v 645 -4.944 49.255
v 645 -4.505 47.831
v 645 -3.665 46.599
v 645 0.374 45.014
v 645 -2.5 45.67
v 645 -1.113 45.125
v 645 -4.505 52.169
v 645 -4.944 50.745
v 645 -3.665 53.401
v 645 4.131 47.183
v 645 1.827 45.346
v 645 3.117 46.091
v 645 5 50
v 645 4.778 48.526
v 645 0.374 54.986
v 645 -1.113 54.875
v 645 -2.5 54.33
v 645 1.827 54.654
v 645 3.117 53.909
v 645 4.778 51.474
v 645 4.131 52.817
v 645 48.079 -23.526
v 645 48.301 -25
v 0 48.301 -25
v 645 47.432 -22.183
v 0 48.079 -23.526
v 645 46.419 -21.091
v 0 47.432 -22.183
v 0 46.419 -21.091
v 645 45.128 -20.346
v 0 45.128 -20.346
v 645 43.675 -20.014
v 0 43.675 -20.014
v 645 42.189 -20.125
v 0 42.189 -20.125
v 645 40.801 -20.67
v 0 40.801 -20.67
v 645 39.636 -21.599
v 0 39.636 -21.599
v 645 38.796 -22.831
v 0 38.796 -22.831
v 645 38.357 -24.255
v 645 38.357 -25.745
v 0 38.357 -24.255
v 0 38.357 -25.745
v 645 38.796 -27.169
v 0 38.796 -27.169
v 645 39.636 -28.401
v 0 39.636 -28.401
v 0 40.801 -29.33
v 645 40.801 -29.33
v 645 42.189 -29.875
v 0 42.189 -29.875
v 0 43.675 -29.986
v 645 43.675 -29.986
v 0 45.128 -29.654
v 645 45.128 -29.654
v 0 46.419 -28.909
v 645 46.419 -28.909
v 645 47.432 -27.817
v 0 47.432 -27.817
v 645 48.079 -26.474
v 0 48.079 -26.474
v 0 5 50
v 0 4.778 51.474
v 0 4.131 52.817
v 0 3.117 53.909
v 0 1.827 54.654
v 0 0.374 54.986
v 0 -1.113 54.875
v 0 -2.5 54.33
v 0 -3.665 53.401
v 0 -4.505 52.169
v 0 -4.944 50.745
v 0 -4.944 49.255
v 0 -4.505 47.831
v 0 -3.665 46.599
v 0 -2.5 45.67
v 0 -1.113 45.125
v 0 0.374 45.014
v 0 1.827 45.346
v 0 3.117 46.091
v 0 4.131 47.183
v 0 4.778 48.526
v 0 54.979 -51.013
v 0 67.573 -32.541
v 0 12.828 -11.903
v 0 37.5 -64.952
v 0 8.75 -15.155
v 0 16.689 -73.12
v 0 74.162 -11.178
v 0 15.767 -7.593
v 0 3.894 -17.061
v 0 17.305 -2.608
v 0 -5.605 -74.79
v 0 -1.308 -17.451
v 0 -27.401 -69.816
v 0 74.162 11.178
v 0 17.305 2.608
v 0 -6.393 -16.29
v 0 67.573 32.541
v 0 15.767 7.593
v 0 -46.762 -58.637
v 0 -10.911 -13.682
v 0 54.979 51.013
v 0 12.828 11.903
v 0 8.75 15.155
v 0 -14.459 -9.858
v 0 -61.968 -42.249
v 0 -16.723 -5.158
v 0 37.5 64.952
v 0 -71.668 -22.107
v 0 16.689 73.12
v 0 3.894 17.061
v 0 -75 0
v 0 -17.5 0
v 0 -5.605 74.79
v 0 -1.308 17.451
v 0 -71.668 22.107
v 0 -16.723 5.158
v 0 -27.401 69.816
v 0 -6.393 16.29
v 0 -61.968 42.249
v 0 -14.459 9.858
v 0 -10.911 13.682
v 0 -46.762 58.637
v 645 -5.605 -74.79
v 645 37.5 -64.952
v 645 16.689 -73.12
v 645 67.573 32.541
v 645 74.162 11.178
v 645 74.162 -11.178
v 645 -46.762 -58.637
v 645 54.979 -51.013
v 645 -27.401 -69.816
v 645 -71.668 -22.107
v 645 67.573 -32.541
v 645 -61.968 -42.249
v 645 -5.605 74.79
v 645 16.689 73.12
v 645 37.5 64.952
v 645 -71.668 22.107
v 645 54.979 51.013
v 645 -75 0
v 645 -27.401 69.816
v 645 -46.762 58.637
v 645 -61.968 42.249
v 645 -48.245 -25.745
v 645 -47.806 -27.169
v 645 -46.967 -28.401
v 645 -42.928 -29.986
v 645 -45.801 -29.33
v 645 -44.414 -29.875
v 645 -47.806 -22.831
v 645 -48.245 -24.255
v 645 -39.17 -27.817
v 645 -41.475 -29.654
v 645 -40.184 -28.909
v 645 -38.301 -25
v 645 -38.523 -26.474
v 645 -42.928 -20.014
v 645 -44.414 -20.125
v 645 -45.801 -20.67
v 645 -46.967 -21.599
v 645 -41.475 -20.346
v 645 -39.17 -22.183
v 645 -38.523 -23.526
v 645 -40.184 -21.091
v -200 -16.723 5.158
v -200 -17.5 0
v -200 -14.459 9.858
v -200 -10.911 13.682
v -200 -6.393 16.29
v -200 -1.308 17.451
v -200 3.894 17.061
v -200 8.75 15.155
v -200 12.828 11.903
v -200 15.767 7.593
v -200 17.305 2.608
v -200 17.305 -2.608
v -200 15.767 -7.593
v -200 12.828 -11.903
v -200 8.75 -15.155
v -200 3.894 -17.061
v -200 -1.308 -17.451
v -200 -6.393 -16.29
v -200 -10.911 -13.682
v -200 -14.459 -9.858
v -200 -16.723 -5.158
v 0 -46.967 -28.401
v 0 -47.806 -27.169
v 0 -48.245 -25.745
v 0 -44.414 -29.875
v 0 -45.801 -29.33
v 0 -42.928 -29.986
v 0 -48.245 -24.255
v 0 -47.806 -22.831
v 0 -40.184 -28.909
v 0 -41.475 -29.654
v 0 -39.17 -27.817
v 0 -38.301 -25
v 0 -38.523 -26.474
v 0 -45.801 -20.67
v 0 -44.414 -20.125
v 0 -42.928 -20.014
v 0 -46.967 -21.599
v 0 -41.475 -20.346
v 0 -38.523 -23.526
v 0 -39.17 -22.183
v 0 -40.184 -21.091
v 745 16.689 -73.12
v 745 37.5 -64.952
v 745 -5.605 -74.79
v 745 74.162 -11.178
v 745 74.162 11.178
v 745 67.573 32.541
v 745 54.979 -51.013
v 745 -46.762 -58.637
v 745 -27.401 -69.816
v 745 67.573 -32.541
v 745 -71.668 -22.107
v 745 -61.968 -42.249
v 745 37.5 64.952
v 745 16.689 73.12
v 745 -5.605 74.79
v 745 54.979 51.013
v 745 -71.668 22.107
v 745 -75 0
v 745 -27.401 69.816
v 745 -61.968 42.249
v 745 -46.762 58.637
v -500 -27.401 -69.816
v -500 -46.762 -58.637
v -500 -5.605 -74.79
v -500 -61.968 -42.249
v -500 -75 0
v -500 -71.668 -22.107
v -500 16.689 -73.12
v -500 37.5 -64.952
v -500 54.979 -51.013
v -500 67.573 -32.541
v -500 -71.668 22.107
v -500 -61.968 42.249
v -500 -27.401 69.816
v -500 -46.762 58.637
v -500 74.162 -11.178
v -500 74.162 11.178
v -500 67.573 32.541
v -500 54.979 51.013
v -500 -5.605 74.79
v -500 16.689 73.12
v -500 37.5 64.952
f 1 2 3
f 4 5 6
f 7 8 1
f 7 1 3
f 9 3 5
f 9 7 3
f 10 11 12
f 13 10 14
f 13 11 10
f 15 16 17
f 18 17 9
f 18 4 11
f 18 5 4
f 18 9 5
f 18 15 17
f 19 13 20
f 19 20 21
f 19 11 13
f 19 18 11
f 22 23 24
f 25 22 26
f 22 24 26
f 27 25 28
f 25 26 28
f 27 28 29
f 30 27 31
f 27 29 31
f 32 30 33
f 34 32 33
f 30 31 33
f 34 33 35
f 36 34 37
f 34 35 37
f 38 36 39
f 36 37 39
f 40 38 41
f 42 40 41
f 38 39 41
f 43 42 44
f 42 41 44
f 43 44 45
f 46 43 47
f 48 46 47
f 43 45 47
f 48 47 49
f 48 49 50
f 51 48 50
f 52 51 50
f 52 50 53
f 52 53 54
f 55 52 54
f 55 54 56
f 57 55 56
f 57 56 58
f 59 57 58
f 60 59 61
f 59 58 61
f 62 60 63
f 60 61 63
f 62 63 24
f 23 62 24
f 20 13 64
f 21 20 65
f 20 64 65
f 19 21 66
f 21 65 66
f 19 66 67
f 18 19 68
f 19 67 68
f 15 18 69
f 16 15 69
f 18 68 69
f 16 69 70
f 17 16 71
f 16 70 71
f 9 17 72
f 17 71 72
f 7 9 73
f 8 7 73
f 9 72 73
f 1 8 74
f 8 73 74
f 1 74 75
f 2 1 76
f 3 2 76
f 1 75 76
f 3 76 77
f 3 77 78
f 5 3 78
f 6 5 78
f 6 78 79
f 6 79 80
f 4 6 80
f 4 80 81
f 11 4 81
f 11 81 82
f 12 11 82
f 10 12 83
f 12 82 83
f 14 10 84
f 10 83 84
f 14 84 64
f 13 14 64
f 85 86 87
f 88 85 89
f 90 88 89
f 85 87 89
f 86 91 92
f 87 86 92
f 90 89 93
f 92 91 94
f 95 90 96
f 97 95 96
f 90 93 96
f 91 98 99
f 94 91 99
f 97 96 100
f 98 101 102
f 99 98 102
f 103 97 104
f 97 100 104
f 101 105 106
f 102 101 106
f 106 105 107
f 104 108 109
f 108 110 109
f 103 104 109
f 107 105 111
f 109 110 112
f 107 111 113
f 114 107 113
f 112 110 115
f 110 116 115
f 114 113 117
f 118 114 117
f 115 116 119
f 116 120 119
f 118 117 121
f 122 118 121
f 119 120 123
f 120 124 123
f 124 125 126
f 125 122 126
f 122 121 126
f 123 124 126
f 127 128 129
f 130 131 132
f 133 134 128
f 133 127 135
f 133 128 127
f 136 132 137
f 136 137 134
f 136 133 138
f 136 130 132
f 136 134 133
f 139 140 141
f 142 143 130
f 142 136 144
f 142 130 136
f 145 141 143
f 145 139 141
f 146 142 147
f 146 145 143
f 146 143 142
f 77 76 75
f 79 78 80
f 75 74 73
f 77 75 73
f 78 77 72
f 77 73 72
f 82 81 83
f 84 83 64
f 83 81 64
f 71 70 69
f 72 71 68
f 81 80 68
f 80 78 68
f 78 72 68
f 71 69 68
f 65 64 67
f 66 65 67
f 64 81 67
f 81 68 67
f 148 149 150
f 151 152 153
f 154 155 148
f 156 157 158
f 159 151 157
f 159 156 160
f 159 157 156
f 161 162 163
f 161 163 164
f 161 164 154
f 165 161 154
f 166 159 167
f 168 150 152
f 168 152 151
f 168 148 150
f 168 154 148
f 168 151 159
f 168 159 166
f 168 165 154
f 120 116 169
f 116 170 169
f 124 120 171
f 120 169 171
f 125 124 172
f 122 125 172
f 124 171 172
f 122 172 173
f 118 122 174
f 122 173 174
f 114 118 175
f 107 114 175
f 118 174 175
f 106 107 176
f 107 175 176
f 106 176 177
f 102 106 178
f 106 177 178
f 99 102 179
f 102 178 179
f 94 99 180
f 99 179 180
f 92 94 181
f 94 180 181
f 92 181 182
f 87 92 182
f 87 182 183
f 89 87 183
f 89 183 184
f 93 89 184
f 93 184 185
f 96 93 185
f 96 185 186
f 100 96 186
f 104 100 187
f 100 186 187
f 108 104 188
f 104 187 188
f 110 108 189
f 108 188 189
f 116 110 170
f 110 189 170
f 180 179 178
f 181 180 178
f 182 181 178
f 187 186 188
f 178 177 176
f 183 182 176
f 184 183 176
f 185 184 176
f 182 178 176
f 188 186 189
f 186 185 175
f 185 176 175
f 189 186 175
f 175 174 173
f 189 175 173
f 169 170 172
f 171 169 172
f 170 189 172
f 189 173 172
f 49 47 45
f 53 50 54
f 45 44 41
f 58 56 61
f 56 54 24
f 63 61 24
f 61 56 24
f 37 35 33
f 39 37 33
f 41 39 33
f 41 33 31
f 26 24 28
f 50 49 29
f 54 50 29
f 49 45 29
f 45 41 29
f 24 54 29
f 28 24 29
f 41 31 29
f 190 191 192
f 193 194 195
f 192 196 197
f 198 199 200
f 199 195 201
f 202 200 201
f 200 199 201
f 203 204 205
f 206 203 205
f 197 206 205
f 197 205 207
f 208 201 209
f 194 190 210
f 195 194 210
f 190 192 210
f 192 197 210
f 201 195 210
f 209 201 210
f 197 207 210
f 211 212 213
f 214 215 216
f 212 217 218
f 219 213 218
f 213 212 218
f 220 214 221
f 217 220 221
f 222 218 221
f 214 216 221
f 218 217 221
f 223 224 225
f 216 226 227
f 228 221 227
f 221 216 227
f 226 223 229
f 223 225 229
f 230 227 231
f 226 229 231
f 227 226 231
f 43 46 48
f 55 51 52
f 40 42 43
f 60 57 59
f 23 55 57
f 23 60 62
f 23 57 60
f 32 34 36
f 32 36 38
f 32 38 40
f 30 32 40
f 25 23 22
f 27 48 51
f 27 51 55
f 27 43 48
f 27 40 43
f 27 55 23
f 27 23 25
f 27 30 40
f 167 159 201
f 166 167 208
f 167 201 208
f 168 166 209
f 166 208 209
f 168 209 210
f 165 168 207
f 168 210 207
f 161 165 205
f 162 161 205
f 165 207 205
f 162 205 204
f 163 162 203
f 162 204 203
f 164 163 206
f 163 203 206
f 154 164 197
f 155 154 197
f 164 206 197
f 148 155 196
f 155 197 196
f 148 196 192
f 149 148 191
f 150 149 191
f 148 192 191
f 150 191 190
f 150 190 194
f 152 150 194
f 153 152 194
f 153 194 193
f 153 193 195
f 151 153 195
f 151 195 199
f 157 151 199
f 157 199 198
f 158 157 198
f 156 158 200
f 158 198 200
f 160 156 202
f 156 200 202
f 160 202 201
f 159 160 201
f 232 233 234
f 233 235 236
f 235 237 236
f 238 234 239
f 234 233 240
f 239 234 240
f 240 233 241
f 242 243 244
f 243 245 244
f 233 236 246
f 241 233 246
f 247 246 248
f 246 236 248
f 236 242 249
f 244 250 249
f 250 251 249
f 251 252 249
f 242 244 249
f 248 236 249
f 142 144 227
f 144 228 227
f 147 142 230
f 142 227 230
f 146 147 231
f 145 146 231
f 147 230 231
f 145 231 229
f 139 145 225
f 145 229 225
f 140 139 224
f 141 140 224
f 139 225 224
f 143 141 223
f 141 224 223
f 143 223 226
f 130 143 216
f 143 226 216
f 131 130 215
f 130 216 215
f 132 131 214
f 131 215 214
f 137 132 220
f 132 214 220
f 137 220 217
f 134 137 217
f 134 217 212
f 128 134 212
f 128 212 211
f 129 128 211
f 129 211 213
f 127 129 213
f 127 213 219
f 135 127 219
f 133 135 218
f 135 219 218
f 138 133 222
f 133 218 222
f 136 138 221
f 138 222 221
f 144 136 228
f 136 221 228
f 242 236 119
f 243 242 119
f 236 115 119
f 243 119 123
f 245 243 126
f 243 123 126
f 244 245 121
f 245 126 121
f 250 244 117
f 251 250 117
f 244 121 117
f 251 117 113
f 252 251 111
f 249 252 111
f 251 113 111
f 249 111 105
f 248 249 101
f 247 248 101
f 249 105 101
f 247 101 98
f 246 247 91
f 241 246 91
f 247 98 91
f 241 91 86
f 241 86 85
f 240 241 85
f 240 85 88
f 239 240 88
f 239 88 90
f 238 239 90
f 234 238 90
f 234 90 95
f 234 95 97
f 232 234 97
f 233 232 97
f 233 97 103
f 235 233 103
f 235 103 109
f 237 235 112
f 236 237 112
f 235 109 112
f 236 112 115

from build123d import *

# Parameters (mm, degrees)
F1_W     = 100
F1_H     = 75
F3_R     = 5
F4_DEPTH = 645


# Not quite as in the source:
# - a feature names something its author has since deleted; it is built from what else it names


with BuildPart() as f2:
    # F0 (on Top) → F2 (revolve)
    with BuildSketch(Plane.XY):
        Polygon((-200, 0), (-500, 0), (-500, -75), (0, -75), (0, -17.5), (-200, -17.5), align=None)
    revolve(axis=Axis((-350, 0, 0), (-1, 0, 0)))


with BuildPart() as f2b:
    # F1 (on Top) → F2, piece 2 (revolve)
    with BuildSketch(Plane.XY):
        with Locations((695, -37.5)):
            Rectangle(F1_W, F1_H)
    revolve(axis=Axis((-350, 0, 0), (-1, 0, 0)))


with BuildPart() as f4:
    # F3 (on Right) → F4 (new body, through all)
    with BuildSketch(Plane.YZ):
        with Locations((0, 50)):
            Circle(F3_R)
    extrude(amount=F4_DEPTH)


with BuildPart() as f4b:
    # F3 (on Right) → F4, piece 2 (new body, through all)
    with BuildSketch(Plane.YZ):
        with Locations((-43.3012701892, -25)):
            Circle(F3_R)
    extrude(amount=F4_DEPTH)


with BuildPart() as f4c:
    # F3 (on Right) → F4, piece 3 (new body, through all)
    with BuildSketch(Plane.YZ):
        with Locations((43.3012701892, -25)):
            Circle(F3_R)
    extrude(amount=F4_DEPTH)


solid = Compound([f2.part, f2b.part, f4.part, f4b.part, f4c.part])
